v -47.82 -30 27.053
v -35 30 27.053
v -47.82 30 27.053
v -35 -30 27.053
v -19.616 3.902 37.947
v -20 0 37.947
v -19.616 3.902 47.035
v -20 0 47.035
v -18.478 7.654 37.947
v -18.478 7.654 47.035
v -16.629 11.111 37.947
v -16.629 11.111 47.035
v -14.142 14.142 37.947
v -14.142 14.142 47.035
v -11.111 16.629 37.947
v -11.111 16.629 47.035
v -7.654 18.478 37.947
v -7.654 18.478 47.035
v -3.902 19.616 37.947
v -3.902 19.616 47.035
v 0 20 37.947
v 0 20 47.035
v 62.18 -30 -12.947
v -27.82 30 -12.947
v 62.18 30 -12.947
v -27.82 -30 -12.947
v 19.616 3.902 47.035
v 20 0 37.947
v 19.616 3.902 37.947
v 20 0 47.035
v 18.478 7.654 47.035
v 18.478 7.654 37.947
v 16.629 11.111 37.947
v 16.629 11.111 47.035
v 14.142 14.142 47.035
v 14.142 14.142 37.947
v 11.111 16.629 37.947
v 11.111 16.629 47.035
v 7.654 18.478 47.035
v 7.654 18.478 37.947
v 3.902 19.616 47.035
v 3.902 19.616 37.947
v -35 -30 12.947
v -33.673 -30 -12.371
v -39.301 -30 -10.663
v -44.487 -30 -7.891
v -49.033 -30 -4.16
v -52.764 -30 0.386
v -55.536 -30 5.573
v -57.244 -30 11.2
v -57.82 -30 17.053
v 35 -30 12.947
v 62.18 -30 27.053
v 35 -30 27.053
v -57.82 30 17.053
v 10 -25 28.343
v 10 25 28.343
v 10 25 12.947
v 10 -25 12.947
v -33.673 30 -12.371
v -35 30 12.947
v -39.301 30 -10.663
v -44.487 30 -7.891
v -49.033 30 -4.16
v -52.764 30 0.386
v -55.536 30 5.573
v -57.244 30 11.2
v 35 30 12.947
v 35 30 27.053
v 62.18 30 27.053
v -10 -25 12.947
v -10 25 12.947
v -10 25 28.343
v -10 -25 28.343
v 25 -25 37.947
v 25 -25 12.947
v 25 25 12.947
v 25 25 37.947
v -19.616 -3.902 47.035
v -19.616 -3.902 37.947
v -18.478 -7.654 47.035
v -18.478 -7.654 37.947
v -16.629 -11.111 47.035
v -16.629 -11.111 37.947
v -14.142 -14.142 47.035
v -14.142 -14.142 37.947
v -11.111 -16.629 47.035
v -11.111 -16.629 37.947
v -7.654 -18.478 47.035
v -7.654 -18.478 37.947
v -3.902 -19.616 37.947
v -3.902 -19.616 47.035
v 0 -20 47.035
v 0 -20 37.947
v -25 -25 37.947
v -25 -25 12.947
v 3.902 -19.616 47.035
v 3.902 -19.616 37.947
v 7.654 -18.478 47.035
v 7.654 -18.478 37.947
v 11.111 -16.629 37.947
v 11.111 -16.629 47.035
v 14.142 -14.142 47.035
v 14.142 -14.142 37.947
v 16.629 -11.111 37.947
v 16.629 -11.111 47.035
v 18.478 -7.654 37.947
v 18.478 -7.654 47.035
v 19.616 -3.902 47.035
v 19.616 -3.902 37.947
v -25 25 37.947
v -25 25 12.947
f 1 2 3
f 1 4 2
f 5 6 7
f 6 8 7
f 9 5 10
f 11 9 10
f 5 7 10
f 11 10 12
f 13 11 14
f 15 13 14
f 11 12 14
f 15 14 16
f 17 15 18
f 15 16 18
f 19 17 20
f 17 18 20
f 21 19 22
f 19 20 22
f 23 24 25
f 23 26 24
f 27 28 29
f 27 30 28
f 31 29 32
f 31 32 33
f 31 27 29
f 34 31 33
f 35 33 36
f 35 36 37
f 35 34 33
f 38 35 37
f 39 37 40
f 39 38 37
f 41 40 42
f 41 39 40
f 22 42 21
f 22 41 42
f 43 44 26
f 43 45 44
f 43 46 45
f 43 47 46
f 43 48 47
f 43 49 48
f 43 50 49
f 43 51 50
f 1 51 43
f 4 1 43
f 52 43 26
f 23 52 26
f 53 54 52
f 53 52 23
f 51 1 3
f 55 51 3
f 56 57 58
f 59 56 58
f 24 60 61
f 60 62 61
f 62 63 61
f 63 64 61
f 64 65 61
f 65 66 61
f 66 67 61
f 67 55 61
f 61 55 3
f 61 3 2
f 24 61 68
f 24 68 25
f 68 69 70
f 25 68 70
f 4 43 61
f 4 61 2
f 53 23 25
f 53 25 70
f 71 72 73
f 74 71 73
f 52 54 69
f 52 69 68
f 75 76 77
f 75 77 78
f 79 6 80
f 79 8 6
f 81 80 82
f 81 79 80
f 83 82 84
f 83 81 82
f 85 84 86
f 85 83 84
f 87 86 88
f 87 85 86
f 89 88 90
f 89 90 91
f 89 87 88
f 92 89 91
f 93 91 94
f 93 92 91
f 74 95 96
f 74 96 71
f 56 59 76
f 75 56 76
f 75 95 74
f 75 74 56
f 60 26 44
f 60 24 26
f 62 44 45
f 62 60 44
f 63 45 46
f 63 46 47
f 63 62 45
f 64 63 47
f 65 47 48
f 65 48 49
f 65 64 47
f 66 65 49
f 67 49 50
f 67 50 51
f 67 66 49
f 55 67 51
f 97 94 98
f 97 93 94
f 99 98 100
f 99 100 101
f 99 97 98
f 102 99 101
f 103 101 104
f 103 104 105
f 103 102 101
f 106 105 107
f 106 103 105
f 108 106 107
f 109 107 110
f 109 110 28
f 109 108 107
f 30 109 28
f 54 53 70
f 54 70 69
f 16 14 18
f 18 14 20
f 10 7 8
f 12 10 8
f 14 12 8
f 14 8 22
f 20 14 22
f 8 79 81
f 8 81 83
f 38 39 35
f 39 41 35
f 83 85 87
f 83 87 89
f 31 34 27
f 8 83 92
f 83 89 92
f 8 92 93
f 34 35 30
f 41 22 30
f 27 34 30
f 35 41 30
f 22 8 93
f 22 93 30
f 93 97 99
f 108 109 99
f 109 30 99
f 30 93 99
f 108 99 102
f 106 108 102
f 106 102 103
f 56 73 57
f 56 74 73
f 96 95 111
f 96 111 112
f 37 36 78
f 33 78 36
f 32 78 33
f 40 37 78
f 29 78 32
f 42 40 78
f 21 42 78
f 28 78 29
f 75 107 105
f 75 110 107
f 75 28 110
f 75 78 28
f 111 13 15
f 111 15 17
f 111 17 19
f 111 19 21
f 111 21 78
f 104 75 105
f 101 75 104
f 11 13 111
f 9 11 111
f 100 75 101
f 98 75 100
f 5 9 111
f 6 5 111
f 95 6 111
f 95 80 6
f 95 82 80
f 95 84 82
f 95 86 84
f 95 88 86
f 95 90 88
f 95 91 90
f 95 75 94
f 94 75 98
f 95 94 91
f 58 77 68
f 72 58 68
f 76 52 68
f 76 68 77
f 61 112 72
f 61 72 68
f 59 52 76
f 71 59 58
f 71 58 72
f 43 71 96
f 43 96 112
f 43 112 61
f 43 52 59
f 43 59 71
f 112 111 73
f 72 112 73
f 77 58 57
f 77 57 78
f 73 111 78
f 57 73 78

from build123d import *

# Parameters (mm, degrees)
F1_DEPTH = 30
F2_DEPTH = 25
F0_W     = 40
F0_H     = 9.0879101008
F3_DEPTH = 20
F4_R     = 30
F5_SIZE  = 9.99999
F6_R     = 19.99999


# Not quite as in the source:
# - a fillet or chamfer is up to 0.001 mm smaller than in the source, because OpenCascade refuses the exact size


with BuildPart() as f1:
    # F0 (on Front) → F1 (new body, symmetric)
    with BuildSketch(Plane.XZ):
        Polygon((-57.820021317, -12.9469532817), (-35, -12.9469532817), (-35, 12.9469532817), (-35, 27.0530467183), (-57.820021317, 27.0530467183), align=None)
        Polygon((-35, -12.9469532817), (35, -12.9469532817), (35, 12.9469532817), (25, 12.9469532817), (10, 12.9469532817), (-10, 12.9469532817), (-25, 12.9469532817), (-35, 12.9469532817), align=None)
        Polygon((35, 12.9469532817), (35, -12.9469532817), (62.179978683, -12.9469532817), (62.179978683, 27.0530467183), (35, 27.0530467183), align=None)
    extrude(amount=F1_DEPTH, both=True)

    # F0 (on Front) → F2 (join, symmetric)
    with BuildSketch(Plane.XZ):
        Polygon((10, 12.9469532817), (25, 12.9469532817), (25, 37.9469532817), (20, 37.9469532817), (-20, 37.9469532817), (-25, 37.9469532817), (-25, 12.9469532817), (-10, 12.9469532817), (-10, 28.3428579569), (10, 28.3428579569), align=None)
    extrude(amount=F2_DEPTH, both=True)

    # F0 (on Front) → F3 (join, symmetric)
    with BuildSketch(Plane.XZ):
        with Locations((0, 42.4909083322)):
            Rectangle(F0_W, F0_H)
    extrude(amount=F3_DEPTH, both=True)

    # F4
    f4_edges = [f1.edges().sort_by_distance(p)[0] for p in [
        (-57.820021, 0, -12.946953),
    ]]
    fillet(f4_edges, radius=F4_R)

    # F5 (size 10 in the source; OpenCascade refuses exactly that, so slightly less here)
    f5_edges = [f1.edges().sort_by_distance(p)[0] for p in [
        (-57.820021, 0, 27.053047),
    ]]
    chamfer(f5_edges, length=F5_SIZE)

    # F6 (radius 20 in the source; OpenCascade refuses exactly that, so slightly less here)
    f6_edges = [f1.edges().sort_by_distance(p)[0] for p in [
        (20, -20, 42.490908),
        (20, 20, 42.490908),
        (-20, -20, 42.490908),
        (-20, 20, 42.490908),
    ]]
    fillet(f6_edges, radius=F6_R)


solid = f1.part
